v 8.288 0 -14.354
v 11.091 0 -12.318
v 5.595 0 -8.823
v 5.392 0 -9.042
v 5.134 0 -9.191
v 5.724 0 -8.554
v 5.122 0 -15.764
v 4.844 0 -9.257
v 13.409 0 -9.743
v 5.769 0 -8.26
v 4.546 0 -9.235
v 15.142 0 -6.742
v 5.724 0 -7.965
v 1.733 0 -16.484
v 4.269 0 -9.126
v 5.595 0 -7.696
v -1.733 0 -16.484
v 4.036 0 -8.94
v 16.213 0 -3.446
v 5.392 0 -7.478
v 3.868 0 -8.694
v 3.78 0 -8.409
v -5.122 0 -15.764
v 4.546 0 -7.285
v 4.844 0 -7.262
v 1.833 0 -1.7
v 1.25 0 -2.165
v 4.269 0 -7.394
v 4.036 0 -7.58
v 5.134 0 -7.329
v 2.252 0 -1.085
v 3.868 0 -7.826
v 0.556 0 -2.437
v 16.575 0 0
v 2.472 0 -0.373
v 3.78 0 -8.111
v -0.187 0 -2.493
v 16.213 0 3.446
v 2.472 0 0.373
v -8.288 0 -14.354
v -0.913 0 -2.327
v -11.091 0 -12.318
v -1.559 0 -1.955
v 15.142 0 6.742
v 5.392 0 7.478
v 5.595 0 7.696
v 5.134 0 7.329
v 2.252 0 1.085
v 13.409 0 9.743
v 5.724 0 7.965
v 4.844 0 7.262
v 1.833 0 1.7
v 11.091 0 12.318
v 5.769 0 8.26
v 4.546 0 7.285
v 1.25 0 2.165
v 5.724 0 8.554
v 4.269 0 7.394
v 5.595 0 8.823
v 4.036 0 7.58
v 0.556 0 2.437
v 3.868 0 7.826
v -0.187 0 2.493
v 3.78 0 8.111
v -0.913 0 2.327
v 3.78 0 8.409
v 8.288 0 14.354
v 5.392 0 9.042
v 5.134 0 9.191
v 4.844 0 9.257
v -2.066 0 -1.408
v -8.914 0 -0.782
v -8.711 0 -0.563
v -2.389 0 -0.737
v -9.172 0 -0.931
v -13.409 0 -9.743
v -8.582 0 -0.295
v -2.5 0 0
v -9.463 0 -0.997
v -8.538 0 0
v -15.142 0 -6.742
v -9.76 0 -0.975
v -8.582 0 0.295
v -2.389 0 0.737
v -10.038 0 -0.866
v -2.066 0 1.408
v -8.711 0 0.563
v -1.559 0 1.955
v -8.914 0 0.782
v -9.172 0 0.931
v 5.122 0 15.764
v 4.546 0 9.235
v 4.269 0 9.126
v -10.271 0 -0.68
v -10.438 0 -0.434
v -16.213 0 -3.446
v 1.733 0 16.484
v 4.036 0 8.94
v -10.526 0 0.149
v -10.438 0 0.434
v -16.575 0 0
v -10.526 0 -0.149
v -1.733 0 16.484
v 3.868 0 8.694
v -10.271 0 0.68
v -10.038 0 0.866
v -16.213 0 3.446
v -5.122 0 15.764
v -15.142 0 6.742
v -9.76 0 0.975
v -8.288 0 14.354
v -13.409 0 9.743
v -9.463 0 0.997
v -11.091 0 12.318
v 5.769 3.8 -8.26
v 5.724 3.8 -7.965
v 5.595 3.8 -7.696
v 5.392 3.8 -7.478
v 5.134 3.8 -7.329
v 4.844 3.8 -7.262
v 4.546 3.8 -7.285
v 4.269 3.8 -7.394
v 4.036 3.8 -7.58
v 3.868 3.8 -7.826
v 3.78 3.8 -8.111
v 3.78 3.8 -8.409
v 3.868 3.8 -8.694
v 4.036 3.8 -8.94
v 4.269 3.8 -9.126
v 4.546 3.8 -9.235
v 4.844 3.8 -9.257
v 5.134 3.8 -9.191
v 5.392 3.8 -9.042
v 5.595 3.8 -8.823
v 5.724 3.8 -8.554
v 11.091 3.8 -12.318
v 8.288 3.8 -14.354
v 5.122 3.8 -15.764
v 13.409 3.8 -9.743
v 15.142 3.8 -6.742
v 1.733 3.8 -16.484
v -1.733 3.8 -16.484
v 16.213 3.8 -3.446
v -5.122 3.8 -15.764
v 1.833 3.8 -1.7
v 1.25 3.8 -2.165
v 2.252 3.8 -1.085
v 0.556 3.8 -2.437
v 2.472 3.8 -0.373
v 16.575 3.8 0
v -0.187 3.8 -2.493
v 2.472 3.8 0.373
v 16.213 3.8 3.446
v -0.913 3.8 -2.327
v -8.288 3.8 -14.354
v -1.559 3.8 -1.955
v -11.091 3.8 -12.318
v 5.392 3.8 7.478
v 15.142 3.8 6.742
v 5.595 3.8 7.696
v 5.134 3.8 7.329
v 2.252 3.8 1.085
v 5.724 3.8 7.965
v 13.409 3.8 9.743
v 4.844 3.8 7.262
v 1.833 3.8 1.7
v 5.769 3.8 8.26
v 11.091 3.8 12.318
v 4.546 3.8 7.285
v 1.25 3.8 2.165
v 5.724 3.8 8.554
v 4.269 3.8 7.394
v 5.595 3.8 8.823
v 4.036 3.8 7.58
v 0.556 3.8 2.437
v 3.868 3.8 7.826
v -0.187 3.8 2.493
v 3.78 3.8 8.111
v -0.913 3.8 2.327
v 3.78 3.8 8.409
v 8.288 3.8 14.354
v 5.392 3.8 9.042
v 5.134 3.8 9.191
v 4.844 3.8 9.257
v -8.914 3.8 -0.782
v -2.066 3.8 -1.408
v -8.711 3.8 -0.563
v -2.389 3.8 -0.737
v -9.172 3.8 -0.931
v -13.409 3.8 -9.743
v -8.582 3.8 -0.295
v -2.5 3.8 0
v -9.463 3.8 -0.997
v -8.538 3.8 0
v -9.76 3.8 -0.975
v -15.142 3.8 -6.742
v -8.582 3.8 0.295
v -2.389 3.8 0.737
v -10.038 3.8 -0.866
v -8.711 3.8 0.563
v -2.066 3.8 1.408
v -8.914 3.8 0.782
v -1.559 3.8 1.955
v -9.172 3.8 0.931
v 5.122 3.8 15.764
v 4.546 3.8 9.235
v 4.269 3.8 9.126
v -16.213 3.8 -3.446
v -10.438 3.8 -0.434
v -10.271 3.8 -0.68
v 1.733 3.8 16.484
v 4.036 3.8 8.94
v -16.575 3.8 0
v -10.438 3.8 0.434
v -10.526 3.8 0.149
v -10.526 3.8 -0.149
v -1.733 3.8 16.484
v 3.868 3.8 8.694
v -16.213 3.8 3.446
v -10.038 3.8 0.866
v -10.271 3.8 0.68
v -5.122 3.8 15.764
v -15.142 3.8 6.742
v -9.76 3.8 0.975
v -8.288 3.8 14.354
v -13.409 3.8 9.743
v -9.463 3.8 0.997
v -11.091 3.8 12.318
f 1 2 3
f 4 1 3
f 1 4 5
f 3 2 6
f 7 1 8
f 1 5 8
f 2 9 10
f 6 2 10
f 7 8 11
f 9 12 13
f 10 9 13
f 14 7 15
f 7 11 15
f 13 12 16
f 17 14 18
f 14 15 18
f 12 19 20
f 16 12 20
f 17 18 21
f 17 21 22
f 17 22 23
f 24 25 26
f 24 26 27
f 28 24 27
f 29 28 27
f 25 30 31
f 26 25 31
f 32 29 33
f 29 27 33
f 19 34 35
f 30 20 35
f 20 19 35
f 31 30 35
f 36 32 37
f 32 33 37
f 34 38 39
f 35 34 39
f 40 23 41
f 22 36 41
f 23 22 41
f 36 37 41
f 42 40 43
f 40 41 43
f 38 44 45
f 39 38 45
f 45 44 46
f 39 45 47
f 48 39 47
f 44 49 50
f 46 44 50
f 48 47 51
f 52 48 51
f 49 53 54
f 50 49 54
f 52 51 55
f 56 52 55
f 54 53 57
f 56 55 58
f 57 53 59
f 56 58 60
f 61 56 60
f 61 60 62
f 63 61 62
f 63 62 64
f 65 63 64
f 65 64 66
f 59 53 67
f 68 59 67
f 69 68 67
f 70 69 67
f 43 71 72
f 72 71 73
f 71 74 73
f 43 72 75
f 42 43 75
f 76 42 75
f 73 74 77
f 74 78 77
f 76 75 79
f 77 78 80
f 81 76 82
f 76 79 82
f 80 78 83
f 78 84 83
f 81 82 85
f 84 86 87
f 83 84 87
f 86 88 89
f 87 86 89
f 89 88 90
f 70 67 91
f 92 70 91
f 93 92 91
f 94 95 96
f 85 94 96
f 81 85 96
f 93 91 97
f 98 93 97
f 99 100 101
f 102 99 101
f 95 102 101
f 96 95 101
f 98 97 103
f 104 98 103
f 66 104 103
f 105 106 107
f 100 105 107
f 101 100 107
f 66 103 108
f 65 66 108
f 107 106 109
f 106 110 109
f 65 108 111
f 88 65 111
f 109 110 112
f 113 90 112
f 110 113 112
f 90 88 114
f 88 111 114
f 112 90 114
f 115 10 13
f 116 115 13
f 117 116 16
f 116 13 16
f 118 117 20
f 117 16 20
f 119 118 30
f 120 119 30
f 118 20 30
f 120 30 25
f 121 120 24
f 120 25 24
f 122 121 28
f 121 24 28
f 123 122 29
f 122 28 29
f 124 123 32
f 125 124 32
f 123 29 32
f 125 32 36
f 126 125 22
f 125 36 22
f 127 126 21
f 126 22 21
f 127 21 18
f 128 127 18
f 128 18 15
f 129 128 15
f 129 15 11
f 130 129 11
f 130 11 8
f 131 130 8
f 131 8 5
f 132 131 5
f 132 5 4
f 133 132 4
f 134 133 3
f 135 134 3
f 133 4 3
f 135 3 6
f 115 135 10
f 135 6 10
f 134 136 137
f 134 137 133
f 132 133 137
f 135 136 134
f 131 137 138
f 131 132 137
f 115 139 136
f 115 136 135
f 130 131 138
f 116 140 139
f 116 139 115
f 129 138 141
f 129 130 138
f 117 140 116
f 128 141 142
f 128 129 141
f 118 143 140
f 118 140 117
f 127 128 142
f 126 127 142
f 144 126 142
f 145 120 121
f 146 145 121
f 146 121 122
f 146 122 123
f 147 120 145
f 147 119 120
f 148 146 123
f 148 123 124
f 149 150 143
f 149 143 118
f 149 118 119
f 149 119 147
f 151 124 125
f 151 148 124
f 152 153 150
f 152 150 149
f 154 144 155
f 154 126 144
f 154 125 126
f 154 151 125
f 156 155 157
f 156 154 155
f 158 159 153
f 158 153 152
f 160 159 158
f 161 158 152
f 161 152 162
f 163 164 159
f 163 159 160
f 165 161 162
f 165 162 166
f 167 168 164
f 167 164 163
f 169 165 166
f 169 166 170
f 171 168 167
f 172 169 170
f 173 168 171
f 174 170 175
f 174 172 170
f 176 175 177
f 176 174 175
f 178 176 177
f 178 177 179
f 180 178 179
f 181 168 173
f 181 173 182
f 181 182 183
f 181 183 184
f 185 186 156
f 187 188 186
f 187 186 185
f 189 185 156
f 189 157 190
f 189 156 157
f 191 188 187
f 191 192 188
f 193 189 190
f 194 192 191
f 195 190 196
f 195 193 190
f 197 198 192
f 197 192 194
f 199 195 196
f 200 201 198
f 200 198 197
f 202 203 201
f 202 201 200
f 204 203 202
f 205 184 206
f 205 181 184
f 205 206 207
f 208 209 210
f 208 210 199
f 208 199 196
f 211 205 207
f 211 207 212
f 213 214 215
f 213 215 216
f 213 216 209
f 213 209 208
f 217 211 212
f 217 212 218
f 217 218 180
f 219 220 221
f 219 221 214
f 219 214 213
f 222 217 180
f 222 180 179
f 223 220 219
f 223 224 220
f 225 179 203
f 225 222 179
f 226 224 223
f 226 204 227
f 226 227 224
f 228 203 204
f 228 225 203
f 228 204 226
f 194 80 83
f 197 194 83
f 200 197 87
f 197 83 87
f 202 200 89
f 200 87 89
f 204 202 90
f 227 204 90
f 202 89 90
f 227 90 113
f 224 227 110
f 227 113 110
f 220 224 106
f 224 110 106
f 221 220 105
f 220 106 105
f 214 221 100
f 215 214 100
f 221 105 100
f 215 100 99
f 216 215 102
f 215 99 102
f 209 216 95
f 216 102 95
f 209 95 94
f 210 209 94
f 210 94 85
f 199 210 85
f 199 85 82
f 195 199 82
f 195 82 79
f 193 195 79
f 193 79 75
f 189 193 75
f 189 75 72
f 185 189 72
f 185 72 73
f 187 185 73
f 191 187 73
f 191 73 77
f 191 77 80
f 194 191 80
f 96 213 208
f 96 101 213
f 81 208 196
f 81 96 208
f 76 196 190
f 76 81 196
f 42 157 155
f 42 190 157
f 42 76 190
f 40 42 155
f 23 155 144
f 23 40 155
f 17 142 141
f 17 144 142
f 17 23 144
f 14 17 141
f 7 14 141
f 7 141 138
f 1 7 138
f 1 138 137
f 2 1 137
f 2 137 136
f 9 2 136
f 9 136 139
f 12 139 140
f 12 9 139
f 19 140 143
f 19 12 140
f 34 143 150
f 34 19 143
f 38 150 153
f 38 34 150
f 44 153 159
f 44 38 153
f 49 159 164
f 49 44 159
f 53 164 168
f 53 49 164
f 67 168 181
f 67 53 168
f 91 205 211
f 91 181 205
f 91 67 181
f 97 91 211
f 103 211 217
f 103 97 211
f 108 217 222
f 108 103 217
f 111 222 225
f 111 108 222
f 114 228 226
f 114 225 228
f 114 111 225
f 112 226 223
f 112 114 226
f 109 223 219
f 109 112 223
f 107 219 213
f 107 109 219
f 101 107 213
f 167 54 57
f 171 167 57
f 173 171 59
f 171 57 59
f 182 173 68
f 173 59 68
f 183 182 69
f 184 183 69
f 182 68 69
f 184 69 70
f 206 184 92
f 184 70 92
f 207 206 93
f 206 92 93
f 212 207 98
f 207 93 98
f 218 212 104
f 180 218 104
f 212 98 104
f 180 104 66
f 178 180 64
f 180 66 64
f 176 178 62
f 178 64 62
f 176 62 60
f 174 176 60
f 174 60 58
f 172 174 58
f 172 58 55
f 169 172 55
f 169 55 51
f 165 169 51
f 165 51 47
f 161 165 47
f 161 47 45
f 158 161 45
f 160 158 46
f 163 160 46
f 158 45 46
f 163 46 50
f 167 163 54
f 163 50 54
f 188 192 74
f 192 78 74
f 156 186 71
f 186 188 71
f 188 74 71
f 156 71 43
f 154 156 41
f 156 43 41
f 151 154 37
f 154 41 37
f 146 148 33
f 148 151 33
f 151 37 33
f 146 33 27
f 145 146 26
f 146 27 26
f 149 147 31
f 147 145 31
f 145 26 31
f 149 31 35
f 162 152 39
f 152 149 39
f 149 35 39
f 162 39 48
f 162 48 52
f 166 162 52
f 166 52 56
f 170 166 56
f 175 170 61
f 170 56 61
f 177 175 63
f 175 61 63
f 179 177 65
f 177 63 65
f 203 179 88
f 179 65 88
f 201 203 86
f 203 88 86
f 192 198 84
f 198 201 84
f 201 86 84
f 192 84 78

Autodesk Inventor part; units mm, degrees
ref_plane "YZ Plane" through (0, 0, 0) normal (1, 0, 0) x (0, 1, 0)
ref_plane "XZ Plane" through (0, 0, 0) normal (0, 1, 0) x (-1, 0, 0)
ref_plane "XY Plane" through (0, 0, 0) normal (0, 0, 1) x (1, 0, 0)
sketch "Sketch1" plane through (0, 0, 0) normal (0, 1, 0) x (-1, 0, 0)
  circle A0 centre (0, 0) radius 16.575
  circle A1 centre (0, 0) radius 2.5
  dimension "d0" = 33.15
  dimension "d1" = 5
extrude "Extrusion1" add sketch "Sketch1" along normal blind 3.8
sketch "Sketch2" plane through (0, 3.8, 0) normal (0, 1, 0) x (1, 0, 0)
  circle A0 centre (0, 0) radius 2.5 projected
  circle A1 centre (0, 0) radius 16.575 projected
  line L0 (-2.5, 0) -> (-16.575, 0)
  circle A2 centre (-9.5375, 0) radius 1.5
  line L1 (0, 0) -> (16.575, 0) construction
  line L2 (0, 0) -> (16.575, 0) construction
  circle A3 centre (4.7688, 8.2597) radius 1.5
  circle A4 centre (4.7688, -8.2597) radius 1.5
  dimension "d4" = 3
  dimension "d7" = 3
  dimension "d8" = 3
extrude "Extrusion2" cut sketch "Sketch2" against normal blind 3.8 contours A2 L0 | L0 A2 | A3 | A4
sketch "Sketch3" plane through (0, 0, 0) normal (0, -1, 0) x (1, 0, 0)
  circle A0 centre (4.7688, -8.2597) radius 1.5 projected
  circle A1 centre (-9.5375, 0) radius 1.5 projected
  circle A2 centre (4.7688, 8.2597) radius 1.5 projected
  circle A3 centre (-9.5375, 0) radius 1
  circle A4 centre (4.7688, 8.2597) radius 1
  circle A5 centre (4.7688, -8.2597) radius 1
  dimension "d11" = 2
  dimension "d12" = 2
  dimension "d13" = 2
extrude "Extrusion3" add sketch "Sketch3" against normal blind 3.8
properties part number "kolecko_rameno(3)"
